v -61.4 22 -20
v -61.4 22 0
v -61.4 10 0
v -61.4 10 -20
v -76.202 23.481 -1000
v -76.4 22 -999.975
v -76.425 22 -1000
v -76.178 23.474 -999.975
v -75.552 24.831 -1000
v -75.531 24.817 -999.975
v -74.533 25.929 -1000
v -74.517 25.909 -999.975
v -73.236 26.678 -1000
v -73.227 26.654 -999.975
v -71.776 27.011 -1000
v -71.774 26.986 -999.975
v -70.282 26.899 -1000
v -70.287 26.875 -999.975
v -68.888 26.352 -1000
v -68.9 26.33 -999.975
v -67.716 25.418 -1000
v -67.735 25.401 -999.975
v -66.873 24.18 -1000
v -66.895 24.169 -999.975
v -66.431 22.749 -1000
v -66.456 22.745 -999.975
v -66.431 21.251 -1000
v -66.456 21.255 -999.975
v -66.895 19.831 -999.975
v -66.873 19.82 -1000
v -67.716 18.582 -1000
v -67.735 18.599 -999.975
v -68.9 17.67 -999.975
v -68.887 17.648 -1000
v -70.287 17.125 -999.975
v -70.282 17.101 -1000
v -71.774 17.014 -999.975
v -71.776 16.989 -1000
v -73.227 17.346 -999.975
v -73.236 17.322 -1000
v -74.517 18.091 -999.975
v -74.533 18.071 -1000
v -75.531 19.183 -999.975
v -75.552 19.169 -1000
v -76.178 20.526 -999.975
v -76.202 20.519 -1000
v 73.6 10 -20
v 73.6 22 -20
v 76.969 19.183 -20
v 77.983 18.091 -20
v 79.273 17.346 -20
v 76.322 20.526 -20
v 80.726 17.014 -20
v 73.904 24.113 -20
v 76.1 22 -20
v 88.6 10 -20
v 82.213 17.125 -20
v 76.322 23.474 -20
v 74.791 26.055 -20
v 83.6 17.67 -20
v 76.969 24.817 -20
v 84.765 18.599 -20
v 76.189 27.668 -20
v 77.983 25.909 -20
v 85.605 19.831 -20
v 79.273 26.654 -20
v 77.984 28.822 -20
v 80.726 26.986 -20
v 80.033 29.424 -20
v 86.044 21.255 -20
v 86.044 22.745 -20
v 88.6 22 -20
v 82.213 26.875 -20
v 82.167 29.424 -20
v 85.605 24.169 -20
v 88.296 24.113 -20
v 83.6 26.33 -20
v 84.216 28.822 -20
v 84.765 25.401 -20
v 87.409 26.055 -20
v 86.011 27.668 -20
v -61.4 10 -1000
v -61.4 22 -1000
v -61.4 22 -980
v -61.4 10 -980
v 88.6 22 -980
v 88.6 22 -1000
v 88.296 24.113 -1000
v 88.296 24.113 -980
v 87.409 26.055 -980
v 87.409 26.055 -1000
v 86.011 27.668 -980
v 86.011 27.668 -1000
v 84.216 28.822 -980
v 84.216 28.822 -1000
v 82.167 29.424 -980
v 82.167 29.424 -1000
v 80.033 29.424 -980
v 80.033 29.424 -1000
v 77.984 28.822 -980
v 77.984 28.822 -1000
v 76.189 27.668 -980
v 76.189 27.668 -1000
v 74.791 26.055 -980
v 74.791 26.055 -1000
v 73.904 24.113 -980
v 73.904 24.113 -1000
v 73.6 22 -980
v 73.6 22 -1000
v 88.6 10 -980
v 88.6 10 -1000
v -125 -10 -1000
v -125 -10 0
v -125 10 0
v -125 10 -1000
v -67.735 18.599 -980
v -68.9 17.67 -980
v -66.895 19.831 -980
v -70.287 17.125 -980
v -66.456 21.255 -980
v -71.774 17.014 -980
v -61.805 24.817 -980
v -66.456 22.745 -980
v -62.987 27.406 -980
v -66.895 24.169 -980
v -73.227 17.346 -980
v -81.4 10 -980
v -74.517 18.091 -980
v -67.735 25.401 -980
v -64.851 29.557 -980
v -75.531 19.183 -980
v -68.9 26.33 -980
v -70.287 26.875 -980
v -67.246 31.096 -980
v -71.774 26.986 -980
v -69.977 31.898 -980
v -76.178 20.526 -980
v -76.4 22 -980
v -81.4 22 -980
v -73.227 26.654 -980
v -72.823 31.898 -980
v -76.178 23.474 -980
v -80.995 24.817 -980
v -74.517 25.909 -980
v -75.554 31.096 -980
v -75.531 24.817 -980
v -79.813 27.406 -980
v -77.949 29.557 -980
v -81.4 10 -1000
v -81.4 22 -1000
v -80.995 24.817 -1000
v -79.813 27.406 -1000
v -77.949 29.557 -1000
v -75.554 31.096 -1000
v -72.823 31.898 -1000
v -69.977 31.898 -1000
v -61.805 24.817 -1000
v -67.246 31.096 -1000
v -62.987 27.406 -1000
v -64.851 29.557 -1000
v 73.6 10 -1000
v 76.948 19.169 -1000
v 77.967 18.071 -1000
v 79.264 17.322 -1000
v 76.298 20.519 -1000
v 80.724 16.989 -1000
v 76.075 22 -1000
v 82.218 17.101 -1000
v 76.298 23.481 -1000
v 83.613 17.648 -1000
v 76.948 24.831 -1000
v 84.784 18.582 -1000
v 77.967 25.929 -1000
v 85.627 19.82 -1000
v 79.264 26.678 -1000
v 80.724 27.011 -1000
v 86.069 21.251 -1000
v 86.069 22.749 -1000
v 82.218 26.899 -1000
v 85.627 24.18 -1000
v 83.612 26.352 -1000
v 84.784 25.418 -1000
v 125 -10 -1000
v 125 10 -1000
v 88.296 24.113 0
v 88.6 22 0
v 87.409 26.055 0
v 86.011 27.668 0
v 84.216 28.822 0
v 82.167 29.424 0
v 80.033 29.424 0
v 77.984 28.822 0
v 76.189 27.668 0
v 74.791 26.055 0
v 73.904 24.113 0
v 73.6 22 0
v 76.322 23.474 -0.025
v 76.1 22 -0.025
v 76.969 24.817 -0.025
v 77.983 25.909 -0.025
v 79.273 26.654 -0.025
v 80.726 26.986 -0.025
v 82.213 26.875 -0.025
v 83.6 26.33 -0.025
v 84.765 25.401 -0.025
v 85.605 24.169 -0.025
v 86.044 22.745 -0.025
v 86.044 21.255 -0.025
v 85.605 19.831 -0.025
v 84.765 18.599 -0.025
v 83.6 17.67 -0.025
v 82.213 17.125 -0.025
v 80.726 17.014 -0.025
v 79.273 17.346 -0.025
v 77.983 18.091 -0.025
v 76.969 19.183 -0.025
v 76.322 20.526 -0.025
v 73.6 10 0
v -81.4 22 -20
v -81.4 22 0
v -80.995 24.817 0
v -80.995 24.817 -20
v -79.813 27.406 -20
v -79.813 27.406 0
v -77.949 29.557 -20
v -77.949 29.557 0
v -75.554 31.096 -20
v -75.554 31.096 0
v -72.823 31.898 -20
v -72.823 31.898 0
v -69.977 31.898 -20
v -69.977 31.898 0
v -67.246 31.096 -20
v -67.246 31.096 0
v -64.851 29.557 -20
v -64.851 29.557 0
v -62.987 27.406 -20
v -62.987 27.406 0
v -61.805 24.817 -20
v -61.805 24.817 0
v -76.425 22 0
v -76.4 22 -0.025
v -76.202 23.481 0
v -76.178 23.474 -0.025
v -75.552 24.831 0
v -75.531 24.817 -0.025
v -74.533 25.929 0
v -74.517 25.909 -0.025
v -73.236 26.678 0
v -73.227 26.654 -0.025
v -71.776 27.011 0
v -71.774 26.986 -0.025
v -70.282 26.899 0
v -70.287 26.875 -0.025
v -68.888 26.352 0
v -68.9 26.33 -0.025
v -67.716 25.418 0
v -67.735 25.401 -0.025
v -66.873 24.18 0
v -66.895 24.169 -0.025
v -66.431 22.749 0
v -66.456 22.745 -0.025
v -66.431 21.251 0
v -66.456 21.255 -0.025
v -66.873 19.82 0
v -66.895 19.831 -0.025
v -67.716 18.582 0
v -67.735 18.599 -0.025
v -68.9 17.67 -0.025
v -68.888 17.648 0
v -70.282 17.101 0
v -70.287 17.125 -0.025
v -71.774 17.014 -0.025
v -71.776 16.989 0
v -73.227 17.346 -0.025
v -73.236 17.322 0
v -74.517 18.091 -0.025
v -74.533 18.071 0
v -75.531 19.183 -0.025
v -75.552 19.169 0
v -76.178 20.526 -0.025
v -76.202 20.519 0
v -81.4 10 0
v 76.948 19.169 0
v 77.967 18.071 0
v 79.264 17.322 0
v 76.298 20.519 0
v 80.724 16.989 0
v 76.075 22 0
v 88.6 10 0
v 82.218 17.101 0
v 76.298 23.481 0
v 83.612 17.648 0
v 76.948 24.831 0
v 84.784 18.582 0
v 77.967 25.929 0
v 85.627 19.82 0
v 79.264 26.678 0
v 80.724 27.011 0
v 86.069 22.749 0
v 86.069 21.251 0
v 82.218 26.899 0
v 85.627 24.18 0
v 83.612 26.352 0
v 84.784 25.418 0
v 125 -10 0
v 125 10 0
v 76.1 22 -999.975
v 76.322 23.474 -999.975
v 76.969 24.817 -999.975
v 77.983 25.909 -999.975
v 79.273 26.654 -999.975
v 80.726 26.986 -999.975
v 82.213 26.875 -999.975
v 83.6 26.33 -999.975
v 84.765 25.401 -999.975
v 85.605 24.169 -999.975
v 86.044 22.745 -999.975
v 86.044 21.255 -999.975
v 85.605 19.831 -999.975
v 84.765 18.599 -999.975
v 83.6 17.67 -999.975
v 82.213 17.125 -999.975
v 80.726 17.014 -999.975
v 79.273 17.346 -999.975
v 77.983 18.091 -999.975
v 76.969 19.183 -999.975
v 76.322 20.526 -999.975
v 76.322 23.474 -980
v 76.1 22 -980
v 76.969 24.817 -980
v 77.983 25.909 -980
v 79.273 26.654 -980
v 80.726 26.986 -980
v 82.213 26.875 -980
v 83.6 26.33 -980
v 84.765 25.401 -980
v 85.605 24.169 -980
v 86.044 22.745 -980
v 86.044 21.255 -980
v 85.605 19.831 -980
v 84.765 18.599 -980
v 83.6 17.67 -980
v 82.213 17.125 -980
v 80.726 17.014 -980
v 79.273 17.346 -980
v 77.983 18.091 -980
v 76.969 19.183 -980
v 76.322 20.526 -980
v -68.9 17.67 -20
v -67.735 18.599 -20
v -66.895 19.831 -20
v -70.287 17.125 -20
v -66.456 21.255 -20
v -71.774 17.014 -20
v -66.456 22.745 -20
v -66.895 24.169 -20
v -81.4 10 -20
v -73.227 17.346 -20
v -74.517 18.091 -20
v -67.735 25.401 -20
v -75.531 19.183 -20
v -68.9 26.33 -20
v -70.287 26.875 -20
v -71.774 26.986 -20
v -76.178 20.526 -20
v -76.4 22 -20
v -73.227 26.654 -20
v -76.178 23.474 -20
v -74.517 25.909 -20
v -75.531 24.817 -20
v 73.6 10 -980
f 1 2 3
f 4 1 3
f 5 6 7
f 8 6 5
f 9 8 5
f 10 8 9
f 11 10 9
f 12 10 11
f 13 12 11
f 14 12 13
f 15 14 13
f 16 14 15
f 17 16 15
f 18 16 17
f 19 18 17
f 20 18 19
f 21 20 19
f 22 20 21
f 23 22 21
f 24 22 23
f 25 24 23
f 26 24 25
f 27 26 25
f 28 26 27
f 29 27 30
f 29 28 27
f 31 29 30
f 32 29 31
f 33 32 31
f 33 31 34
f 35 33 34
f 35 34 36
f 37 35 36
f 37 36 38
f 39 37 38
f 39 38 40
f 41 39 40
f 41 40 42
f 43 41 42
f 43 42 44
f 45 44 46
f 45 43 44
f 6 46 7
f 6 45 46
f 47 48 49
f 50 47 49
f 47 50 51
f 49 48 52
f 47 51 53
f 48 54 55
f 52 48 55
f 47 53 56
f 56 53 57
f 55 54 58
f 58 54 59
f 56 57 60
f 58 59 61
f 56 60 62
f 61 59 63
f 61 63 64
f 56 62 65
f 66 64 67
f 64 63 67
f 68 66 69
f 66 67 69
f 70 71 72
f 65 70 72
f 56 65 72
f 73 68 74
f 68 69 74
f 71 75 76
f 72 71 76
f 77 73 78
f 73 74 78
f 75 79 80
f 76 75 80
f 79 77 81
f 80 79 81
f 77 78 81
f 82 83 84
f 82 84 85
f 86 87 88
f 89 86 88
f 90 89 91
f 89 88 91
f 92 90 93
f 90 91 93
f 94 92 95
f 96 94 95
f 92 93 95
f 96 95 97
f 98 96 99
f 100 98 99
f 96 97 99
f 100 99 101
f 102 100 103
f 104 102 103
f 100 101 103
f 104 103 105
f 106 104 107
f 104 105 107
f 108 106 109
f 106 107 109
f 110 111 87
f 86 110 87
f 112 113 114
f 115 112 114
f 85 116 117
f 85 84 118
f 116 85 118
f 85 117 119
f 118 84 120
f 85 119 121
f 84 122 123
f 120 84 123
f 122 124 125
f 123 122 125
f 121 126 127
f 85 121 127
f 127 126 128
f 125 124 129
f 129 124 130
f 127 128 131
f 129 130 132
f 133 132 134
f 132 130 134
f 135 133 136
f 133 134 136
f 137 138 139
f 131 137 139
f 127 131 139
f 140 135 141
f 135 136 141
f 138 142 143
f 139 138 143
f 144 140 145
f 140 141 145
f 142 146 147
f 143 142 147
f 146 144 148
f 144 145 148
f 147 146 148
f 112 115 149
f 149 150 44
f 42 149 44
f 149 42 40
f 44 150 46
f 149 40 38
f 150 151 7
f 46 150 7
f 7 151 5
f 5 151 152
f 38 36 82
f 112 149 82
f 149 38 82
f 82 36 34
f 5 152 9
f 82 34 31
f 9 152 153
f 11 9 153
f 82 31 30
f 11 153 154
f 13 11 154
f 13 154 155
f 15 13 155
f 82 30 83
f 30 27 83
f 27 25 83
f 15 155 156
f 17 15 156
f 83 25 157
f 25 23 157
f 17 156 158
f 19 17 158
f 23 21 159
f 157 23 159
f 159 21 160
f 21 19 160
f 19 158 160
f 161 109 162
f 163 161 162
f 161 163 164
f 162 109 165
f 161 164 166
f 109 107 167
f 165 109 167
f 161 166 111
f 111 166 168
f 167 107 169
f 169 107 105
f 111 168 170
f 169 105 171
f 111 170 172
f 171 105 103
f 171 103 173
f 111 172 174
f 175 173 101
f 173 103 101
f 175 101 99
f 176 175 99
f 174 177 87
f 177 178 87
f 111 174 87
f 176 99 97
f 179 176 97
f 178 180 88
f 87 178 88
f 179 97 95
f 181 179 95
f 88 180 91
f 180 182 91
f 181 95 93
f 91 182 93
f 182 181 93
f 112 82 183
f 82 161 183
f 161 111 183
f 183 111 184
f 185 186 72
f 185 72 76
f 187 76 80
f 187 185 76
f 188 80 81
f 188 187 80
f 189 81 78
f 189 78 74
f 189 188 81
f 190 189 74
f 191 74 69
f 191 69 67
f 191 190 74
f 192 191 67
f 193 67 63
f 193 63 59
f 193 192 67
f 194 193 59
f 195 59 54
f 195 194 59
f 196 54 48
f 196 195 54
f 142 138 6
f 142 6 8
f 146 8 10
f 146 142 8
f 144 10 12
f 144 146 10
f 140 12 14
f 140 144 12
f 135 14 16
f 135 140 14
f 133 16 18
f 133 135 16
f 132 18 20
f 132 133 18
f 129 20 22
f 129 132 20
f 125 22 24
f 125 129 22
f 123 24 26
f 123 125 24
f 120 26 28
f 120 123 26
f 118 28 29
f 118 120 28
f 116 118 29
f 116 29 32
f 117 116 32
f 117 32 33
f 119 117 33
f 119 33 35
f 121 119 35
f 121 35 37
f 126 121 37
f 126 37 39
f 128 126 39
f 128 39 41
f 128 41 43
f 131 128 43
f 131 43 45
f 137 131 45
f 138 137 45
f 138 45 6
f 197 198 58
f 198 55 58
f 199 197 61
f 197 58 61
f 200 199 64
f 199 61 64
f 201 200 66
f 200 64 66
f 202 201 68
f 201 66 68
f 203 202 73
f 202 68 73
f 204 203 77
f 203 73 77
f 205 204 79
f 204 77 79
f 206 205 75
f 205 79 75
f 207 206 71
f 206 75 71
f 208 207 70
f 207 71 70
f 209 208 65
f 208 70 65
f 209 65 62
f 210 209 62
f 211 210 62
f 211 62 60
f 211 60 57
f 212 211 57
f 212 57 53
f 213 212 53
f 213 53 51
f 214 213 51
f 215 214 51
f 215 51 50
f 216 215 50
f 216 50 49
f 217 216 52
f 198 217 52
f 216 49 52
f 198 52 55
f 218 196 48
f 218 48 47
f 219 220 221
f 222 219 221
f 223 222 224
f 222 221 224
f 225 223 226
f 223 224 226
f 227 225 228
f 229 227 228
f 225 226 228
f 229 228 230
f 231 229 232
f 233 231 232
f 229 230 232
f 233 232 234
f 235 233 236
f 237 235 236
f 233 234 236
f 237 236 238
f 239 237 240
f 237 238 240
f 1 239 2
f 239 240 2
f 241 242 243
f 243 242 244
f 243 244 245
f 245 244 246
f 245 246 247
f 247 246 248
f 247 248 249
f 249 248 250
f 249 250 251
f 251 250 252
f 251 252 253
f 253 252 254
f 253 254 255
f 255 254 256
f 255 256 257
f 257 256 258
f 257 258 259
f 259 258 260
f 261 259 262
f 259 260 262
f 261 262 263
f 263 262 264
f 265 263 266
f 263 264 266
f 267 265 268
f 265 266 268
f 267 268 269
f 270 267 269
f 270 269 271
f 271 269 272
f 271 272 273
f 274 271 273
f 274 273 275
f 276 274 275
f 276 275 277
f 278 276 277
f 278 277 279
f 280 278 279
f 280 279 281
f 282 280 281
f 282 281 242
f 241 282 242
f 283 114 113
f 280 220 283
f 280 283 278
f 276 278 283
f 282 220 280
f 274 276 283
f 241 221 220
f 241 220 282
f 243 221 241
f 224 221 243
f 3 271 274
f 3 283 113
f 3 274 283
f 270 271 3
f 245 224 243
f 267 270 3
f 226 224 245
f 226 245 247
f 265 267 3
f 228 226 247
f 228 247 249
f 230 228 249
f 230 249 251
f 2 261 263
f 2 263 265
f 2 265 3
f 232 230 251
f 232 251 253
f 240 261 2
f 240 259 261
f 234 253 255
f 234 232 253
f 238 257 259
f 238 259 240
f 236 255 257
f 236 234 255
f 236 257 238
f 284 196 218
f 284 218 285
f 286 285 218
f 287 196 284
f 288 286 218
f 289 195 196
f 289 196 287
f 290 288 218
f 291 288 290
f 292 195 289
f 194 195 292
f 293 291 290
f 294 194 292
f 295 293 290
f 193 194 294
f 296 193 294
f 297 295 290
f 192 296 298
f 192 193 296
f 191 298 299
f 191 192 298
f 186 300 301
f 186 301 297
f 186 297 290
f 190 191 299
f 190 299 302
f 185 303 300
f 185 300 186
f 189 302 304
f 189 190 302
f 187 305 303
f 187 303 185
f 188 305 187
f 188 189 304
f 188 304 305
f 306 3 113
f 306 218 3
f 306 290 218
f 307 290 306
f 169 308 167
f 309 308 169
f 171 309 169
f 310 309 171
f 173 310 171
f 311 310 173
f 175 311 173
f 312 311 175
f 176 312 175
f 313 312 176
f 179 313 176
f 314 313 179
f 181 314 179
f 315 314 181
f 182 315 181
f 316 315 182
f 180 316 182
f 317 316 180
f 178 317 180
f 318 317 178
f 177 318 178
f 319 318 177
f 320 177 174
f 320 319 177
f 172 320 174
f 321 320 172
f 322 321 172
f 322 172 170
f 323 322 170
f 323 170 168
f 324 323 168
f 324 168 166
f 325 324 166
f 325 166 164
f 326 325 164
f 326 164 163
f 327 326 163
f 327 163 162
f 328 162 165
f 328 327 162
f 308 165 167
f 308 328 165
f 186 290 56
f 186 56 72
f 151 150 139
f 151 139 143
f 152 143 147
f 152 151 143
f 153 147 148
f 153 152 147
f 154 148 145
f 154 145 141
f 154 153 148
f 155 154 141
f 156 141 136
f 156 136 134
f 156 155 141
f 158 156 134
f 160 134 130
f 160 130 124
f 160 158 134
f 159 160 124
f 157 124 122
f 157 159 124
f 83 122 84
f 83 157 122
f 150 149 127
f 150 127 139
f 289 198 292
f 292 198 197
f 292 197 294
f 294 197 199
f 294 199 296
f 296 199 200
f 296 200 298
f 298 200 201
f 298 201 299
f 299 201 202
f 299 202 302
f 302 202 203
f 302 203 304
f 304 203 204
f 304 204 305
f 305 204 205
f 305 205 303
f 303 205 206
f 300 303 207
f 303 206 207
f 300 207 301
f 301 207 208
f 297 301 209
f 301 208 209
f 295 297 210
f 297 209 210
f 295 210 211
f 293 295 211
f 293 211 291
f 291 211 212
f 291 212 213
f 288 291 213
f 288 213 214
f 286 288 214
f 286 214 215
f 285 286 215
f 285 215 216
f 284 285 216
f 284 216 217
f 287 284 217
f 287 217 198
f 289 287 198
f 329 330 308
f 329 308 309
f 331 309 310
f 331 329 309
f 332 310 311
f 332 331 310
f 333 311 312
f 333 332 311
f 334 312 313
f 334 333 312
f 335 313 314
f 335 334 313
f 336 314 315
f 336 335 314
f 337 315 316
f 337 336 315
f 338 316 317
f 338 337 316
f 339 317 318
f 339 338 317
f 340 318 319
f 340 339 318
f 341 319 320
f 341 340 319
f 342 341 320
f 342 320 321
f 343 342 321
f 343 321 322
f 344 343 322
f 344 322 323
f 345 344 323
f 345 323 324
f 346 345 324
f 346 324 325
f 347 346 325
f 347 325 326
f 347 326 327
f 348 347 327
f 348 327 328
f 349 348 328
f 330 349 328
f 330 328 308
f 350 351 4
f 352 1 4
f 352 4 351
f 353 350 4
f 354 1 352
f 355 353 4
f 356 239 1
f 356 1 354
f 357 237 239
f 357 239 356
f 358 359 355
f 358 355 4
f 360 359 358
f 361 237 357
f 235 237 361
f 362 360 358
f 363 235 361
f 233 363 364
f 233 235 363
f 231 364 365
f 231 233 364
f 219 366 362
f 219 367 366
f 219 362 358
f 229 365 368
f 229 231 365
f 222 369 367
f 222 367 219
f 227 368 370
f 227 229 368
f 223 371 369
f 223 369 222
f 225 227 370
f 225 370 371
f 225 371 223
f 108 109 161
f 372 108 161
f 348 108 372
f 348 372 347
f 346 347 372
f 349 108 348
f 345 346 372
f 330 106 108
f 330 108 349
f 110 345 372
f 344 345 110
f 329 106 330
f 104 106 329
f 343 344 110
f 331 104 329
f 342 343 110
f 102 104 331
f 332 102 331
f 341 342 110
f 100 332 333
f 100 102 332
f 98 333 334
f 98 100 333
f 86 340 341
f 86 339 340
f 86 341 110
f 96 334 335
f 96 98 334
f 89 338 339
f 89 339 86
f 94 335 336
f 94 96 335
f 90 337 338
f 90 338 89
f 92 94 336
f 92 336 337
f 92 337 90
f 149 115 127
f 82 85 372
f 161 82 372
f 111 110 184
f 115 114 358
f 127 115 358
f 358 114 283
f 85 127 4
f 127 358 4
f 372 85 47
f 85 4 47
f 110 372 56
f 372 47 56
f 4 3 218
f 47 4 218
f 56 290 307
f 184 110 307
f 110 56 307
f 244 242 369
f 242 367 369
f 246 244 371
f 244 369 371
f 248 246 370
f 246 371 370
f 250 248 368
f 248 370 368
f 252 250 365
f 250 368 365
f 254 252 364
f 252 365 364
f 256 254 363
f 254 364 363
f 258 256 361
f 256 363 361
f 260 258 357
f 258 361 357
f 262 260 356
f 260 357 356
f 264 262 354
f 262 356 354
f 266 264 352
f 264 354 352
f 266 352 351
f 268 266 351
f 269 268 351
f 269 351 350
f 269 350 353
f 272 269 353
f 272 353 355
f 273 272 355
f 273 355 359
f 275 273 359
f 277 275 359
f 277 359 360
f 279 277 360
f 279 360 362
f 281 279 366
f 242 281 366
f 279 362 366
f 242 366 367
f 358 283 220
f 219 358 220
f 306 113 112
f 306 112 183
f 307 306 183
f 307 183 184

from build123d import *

# Parameters (mm, degrees)
SKETCH2_W                        = 250
SKETCH2_H                        = 20
BOSS_EXTRUDE1_DEPTH              = 1000
BOSS_EXTRUDE2_DEPTH              = 20
BOSS_EXTRUDE3_DEPTH              = 20
F_10_0MM_DOWEL_HOLE1_D           = 10
F_10_0MM_DOWEL_HOLE1_CSINK_D     = 10.05
F_10_0MM_DOWEL_HOLE1_CSINK_ANGLE = 90


with BuildPart() as part:
    # Sketch2 → Boss-Extrude1 (new body)
    with BuildSketch(Plane.XY):
        Rectangle(SKETCH2_W, SKETCH2_H)
    extrude(amount=-BOSS_EXTRUDE1_DEPTH)

    # Sketch3 → Boss-Extrude2 (add)
    with BuildSketch(Plane.XY):
        with BuildLine():
            Line((88.6, 10), (88.6, 22))
            ThreePointArc((88.6, 22), (81.1, 29.5), (73.6, 22))
            Line((73.6, 22), (73.6, 10))
            Line((73.6, 10), (88.6, 10))
        make_face()
    boss_extrude2 = extrude(amount=-BOSS_EXTRUDE2_DEPTH)

    # Sketch4 → Boss-Extrude3 (add)
    with BuildSketch(Plane.XY):
        with BuildLine():
            Line((-81.4, 10), (-81.4, 22))
            ThreePointArc((-81.4, 22), (-71.4, 32), (-61.4, 22))
            Line((-61.4, 22), (-61.4, 10))
            Line((-61.4, 10), (-81.4, 10))
        make_face()
    boss_extrude3 = extrude(amount=-BOSS_EXTRUDE3_DEPTH)

    # Ø10.0mm Dowel Hole1 (through all)
    with Locations(Plane.XY):
        with Locations((-71.4, 22), (81.1, 22)):
            f_10_0mm_dowel_hole1 = CounterSinkHole(F_10_0MM_DOWEL_HOLE1_D / 2, F_10_0MM_DOWEL_HOLE1_CSINK_D / 2, counter_sink_angle=F_10_0MM_DOWEL_HOLE1_CSINK_ANGLE)

    # Mirror1: Boss-Extrude2, Boss-Extrude3, Ø10.0mm Dowel Hole1 across plane
    add(boss_extrude2.mirror(Plane.XY.offset(-500)))
    add(boss_extrude3.mirror(Plane.XY.offset(-500)))
    add(f_10_0mm_dowel_hole1.mirror(Plane.XY.offset(-500)), mode=Mode.SUBTRACT)


solid = part.part
